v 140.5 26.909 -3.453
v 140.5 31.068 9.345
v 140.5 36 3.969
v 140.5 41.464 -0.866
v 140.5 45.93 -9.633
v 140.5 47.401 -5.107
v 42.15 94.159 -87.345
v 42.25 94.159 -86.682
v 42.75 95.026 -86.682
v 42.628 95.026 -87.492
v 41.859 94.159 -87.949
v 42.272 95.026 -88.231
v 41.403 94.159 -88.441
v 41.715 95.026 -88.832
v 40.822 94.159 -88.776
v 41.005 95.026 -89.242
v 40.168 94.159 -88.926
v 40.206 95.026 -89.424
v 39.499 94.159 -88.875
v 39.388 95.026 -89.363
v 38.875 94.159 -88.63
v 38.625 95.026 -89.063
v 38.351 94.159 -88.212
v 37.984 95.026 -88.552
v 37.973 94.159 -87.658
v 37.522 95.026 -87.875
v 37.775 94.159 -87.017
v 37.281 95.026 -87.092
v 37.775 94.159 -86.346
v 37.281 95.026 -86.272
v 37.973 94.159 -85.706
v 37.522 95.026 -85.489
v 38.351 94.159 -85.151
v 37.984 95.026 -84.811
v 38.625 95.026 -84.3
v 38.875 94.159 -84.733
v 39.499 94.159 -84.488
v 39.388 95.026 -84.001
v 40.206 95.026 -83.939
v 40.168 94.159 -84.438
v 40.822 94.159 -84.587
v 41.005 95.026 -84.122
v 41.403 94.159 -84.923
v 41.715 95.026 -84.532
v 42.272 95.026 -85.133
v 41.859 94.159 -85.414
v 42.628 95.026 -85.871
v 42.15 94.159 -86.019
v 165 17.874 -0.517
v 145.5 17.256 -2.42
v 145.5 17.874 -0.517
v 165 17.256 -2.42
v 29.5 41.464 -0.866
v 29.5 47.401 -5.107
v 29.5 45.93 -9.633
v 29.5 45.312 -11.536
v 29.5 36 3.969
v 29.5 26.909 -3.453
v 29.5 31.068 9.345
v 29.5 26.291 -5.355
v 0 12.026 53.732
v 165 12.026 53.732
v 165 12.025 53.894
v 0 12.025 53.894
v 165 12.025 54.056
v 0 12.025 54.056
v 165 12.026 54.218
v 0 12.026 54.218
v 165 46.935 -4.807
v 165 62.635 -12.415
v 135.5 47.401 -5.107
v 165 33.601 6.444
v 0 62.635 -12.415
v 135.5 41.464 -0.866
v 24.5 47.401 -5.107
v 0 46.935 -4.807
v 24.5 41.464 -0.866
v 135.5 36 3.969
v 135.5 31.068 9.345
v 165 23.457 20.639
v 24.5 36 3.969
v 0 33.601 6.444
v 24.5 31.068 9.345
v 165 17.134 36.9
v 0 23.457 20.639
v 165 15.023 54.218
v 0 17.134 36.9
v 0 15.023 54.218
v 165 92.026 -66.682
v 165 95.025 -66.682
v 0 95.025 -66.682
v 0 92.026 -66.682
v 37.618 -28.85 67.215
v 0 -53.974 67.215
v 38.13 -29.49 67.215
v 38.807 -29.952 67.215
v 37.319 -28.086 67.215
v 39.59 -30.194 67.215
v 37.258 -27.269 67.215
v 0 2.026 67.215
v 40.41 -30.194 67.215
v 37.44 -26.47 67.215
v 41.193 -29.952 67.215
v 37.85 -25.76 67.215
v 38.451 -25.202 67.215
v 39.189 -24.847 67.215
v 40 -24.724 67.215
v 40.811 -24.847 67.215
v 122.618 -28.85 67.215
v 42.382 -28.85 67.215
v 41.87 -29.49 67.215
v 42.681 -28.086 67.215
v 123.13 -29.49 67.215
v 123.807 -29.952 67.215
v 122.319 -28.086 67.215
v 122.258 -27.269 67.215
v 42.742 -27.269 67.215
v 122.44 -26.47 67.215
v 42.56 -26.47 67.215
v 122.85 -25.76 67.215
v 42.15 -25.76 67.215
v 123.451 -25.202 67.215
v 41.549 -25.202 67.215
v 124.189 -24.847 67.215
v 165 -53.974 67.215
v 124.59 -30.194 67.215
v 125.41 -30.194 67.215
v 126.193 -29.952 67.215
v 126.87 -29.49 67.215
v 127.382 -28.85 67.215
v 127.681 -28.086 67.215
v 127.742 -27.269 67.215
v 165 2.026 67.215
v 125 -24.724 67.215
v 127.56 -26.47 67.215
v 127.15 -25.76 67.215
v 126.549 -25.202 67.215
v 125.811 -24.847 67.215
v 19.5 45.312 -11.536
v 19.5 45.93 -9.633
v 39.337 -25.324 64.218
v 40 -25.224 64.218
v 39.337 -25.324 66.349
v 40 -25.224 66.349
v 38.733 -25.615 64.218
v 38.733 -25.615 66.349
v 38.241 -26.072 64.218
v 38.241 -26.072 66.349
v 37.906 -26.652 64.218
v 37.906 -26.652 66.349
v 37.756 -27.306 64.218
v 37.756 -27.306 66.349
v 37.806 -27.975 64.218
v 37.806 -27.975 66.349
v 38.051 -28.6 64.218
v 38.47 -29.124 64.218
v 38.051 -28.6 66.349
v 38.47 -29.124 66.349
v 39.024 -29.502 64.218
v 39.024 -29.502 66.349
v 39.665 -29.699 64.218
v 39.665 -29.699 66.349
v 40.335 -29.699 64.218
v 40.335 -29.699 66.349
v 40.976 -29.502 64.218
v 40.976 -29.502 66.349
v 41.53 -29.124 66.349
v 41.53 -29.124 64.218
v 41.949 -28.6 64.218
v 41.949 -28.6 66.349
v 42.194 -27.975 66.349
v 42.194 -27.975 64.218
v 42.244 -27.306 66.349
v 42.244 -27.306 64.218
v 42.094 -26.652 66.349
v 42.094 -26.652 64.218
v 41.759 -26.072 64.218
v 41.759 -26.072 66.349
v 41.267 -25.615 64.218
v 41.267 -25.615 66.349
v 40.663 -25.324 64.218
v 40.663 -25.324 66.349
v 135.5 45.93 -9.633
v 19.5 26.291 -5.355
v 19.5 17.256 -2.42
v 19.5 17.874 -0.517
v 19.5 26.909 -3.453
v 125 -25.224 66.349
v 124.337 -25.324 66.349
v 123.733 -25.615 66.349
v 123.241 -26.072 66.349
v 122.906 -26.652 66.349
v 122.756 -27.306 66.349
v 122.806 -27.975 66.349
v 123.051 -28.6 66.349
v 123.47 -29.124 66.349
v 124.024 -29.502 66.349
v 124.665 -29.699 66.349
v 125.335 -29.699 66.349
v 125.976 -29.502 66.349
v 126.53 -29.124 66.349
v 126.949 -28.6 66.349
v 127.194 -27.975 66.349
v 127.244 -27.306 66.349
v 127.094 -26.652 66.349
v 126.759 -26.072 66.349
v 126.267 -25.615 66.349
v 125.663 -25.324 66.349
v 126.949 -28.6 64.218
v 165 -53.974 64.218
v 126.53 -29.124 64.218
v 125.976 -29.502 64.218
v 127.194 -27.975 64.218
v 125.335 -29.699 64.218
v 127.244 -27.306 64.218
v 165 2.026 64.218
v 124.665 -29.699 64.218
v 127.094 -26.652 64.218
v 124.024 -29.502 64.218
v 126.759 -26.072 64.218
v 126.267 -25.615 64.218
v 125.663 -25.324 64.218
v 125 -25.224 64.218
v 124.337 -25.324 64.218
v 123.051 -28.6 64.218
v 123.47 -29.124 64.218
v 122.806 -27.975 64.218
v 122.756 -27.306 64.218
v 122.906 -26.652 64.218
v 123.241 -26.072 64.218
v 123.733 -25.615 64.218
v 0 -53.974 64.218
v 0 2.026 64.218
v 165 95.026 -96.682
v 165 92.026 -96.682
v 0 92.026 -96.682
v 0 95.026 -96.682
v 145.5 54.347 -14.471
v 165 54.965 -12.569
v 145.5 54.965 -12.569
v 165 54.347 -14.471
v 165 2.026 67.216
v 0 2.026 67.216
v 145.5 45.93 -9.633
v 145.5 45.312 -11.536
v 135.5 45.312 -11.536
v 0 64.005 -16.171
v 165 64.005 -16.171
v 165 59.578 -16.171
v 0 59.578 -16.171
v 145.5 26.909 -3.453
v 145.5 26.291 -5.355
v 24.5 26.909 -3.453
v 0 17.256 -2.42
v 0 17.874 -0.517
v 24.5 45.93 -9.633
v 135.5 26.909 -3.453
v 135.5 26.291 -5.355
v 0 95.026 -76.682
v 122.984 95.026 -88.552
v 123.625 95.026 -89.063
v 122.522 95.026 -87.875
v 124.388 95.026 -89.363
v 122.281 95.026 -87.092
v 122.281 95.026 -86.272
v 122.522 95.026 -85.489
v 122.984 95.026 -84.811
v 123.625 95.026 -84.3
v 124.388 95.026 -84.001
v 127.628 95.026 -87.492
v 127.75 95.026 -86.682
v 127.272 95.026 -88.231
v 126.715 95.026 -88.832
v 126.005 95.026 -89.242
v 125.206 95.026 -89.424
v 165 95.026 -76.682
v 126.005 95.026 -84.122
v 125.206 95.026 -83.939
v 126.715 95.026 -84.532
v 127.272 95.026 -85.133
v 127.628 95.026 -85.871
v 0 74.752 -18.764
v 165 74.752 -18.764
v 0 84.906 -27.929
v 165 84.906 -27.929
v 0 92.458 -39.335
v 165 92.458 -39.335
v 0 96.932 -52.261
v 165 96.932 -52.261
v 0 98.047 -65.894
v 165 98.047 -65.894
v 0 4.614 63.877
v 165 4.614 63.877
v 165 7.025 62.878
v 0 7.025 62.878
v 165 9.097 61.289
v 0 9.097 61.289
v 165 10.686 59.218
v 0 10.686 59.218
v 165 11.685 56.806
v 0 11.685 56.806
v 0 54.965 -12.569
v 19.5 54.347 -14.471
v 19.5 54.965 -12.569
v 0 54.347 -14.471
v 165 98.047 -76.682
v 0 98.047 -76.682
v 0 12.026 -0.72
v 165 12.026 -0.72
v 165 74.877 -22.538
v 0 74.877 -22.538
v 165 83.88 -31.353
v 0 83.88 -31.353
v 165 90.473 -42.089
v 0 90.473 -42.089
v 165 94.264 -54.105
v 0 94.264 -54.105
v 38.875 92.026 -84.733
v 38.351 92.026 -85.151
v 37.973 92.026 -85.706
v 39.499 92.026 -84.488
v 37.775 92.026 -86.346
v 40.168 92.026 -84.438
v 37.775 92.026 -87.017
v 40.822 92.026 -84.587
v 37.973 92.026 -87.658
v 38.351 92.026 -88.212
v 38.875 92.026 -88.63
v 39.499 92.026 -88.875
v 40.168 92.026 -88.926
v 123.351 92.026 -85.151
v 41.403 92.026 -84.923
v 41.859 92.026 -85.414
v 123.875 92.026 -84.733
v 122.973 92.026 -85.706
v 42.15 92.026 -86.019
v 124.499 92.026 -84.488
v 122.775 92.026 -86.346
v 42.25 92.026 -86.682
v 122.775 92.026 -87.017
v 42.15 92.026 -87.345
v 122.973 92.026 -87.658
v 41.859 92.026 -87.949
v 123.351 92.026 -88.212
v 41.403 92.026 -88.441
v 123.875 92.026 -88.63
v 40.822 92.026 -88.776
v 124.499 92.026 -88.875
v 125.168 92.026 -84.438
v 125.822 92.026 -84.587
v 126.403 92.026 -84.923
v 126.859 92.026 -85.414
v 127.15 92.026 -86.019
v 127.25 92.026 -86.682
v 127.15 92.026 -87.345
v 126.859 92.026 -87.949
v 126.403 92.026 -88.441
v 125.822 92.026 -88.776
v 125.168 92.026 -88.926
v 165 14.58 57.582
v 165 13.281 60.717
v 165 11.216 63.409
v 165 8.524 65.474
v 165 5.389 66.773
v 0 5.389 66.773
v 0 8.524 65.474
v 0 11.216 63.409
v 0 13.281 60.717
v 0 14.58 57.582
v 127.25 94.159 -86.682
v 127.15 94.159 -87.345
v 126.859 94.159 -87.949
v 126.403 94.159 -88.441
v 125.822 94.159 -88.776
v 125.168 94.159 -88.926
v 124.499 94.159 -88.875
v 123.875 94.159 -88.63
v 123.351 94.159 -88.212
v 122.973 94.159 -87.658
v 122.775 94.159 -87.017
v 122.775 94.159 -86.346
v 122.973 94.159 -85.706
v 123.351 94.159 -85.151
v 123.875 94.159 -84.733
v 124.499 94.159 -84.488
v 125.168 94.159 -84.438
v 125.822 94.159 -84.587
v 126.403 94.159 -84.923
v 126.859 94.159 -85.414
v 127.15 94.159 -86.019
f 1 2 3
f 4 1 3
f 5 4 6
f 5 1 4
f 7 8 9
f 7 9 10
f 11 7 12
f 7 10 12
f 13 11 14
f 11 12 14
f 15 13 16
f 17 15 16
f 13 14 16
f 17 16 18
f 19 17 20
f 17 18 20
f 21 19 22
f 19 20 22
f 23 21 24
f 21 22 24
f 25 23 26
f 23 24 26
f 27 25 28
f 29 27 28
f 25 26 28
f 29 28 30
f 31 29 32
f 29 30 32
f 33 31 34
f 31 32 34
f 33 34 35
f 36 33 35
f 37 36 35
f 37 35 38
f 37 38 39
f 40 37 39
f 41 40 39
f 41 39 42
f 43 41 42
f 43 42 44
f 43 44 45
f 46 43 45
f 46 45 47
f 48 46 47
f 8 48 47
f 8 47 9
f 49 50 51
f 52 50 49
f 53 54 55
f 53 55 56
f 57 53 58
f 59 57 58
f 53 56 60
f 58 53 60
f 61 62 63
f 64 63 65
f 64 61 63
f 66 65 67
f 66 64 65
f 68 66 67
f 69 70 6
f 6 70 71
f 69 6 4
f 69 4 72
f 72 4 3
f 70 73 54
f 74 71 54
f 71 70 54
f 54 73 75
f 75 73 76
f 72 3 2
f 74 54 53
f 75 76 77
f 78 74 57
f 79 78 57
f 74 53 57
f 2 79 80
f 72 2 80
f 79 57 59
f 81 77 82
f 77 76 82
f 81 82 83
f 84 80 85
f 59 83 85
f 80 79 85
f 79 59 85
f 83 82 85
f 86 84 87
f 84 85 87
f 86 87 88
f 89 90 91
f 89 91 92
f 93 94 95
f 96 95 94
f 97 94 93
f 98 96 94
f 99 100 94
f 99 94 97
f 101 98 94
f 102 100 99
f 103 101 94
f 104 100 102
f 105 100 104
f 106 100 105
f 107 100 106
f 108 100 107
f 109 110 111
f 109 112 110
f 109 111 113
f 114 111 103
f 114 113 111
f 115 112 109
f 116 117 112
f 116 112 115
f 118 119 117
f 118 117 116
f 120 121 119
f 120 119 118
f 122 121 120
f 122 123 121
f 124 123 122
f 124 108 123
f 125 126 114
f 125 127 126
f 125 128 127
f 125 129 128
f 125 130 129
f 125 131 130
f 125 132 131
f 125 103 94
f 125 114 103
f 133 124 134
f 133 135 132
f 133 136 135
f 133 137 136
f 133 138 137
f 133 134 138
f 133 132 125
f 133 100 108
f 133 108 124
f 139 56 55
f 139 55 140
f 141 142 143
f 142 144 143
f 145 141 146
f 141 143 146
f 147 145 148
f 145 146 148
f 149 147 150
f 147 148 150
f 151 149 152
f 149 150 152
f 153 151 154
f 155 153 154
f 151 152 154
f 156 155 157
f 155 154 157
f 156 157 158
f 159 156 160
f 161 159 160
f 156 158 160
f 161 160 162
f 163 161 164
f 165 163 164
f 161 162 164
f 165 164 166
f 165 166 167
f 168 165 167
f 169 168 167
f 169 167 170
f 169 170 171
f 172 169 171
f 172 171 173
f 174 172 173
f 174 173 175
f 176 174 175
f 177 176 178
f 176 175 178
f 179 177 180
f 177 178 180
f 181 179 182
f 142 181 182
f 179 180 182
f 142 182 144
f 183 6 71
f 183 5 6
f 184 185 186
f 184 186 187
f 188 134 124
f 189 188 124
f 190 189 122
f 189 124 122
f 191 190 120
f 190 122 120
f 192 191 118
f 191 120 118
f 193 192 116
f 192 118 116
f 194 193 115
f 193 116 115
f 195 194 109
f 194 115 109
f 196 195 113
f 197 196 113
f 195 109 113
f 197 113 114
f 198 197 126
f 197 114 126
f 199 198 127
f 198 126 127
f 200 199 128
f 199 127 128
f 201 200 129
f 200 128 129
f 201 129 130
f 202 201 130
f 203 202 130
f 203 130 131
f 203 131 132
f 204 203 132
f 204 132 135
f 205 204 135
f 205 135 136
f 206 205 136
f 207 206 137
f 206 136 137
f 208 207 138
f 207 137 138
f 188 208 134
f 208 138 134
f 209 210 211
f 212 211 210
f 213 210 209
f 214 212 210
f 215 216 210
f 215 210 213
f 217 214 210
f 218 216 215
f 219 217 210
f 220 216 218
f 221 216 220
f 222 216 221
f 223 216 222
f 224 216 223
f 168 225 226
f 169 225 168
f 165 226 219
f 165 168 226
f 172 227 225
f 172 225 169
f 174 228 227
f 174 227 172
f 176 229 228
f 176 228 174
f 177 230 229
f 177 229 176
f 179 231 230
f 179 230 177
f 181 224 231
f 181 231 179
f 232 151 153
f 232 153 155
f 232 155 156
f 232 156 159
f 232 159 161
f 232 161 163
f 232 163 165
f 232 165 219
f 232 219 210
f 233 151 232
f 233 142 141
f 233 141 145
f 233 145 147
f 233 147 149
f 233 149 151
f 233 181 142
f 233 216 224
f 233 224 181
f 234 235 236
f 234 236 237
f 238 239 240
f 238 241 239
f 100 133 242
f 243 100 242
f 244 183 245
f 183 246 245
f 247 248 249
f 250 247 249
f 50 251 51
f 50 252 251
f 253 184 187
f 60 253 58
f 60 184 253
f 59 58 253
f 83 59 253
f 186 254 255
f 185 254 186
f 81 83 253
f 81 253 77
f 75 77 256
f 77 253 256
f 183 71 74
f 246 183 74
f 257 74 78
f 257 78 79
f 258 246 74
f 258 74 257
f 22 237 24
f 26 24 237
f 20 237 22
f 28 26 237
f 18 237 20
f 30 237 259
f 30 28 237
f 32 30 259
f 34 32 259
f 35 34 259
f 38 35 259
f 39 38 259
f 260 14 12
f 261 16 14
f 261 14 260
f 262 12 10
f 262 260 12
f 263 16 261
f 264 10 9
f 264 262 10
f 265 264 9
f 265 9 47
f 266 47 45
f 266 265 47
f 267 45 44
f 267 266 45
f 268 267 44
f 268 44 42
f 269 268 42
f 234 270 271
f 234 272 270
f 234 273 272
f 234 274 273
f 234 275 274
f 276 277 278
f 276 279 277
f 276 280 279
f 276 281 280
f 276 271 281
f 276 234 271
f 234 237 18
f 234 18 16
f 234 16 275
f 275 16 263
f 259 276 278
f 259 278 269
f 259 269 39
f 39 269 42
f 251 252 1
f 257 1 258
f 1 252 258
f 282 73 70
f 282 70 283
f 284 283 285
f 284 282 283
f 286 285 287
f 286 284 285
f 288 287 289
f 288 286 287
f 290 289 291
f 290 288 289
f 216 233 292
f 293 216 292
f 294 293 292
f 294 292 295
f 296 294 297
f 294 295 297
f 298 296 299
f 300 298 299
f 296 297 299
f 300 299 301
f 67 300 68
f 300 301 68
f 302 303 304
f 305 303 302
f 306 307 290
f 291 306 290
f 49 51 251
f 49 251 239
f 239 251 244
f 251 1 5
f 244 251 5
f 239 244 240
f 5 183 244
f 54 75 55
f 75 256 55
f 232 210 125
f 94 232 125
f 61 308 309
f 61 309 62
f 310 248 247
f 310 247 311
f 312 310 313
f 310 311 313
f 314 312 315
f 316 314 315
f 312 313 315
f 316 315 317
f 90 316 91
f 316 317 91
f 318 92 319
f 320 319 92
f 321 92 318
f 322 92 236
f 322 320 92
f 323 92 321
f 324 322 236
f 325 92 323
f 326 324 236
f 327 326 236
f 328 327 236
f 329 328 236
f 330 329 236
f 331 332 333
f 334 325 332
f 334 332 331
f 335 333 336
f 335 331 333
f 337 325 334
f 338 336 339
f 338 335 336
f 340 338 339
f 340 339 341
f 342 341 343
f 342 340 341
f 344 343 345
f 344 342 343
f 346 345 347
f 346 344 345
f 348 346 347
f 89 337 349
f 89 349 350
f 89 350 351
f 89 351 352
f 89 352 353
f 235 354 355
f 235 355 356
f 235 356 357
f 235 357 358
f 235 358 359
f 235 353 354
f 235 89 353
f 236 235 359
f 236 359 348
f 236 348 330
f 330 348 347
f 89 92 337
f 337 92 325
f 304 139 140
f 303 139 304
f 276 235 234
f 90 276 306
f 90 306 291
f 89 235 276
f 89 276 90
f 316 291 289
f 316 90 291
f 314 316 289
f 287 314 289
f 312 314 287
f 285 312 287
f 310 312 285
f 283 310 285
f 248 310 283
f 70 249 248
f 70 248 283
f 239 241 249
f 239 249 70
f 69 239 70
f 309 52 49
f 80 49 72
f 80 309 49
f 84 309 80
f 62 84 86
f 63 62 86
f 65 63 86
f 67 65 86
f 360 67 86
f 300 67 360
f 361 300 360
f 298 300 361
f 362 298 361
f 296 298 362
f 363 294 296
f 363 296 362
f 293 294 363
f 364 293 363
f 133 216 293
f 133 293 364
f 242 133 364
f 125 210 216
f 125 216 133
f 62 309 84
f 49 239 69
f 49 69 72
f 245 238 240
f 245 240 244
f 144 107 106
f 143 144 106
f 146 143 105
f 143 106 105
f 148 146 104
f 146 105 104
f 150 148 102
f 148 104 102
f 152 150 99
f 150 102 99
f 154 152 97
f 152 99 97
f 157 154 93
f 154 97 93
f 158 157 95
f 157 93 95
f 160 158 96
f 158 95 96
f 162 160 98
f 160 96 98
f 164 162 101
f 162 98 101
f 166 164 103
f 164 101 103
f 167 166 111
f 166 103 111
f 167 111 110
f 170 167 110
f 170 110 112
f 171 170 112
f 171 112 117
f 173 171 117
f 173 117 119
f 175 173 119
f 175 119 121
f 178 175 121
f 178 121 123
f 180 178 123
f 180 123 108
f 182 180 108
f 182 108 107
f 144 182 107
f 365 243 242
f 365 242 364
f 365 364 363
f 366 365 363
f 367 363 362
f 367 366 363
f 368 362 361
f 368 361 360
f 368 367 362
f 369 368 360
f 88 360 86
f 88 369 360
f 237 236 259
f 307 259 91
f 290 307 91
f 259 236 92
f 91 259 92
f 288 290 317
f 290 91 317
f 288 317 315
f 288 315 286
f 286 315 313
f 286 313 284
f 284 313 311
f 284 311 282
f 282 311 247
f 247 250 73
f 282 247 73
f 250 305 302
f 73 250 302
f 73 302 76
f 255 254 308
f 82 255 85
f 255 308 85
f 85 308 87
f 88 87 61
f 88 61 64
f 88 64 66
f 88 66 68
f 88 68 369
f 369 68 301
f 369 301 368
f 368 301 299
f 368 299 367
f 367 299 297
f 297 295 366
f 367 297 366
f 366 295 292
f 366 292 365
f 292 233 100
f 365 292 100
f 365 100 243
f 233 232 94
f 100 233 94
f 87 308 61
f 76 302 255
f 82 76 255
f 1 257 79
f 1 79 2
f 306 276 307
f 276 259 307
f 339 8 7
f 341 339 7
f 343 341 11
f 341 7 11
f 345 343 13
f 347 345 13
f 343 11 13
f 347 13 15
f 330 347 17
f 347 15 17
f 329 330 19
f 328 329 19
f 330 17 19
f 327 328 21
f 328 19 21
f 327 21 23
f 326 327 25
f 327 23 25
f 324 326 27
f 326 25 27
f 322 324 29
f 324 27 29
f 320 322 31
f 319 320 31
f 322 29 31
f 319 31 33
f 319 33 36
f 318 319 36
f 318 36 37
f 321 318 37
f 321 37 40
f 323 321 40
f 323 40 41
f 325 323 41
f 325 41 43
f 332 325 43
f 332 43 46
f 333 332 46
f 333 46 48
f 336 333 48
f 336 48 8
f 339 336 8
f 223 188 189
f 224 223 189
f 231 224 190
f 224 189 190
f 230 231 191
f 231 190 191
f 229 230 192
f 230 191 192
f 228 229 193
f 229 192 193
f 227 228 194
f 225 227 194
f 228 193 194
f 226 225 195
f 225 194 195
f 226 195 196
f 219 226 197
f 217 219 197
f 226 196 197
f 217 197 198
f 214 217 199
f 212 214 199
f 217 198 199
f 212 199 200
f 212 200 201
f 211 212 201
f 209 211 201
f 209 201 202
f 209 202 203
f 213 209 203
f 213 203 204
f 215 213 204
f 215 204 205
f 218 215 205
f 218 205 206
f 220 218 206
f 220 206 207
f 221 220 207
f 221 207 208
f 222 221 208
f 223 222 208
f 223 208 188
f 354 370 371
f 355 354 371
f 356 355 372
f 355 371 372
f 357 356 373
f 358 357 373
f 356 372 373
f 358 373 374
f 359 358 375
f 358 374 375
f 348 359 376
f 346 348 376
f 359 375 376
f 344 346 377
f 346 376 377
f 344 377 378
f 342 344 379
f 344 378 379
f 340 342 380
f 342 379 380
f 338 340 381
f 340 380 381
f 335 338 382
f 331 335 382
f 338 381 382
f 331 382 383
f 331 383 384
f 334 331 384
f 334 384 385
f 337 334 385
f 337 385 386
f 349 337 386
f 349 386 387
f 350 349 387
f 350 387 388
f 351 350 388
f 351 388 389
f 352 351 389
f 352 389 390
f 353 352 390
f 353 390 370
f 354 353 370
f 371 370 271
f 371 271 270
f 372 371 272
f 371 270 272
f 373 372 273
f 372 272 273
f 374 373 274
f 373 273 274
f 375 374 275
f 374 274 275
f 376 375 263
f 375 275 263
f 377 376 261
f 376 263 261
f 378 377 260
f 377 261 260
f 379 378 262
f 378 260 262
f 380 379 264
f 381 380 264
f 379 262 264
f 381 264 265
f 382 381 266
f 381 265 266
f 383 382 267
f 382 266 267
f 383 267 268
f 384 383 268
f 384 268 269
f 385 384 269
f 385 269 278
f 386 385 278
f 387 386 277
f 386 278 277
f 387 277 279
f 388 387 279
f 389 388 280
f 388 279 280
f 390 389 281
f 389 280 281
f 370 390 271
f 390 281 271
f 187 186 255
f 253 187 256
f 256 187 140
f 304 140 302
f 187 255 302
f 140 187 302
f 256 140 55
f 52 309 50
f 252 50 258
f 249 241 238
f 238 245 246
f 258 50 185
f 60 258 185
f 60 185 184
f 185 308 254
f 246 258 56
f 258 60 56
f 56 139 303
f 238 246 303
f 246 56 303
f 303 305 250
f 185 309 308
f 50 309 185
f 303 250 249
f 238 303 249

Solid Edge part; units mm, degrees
sketch "Sketch1" plane through (0, 0, 0) normal (1, 0, 0) x (0, 1, 0)
  arc A0 (2.0255, 64.2182) -> (12.0255, 54.2182) centre (2.0255, 54.2182) cw
  arc A1 (12.0255, 54.2182) -> (62.1552, -15.4154) centre (85.1165, 53.9757) ccw
  arc A2 (62.1552, -15.4154) -> (95.0255, -66.6818) centre (43.6001, -63.4831) cw
  line L0 (95.0255, -66.6818) -> (95.0255, -76.6818)
  line L1 (95.0255, -76.6818) -> (98.0468, -76.6818)
  line L2 (98.0468, -76.6818) -> (98.0468, -65.8944)
  arc A3 (62.6354, -12.4154) -> (98.0468, -65.8944) centre (43.6001, -63.4831) cw
  arc A4 (15.0228, 54.2182) -> (62.6354, -12.4154) centre (85.1165, 53.9757) ccw
  arc A5 (2.0255, 67.2155) -> (15.0228, 54.2182) centre (2.0255, 54.2182) cw
  line L3 (2.0255, 64.2182) -> (2.0255, 67.2155)
  dimension "D1" = 130.9
  dimension "D2" = 93
  dimension "D3" = 10
  dimension "D4" = 10
  dimension "D5" = 3
  dimension "D6" = 2.9973
  dimension "D7" = 12.9973
extrude "Protrusion1" add sketch "Sketch1" along normal blind 165
sketch "Sketch2" plane through (75, 2.0255, 65.7168) normal (0, -1, 0) x (1, 0, 0)
  line L0 (-75, 1.4986) -> (90, 1.4986)
  line L1 (90, 1.4986) -> (90, -1.4986)
  line L2 (90, -1.4986) -> (-75, -1.4986)
  line L3 (-75, -1.4986) -> (-75, 1.4986)
extrude "Extrusionsausprägung_2" add sketch "Sketch2" along normal blind 56
sketch "Sketch3" plane through (82.5, -22.9745, 67.2155) normal (0, 0, 1) x (0, 1, 0)
  circle A0 centre (-4.5, 42.5) radius 2.25
  circle A1 centre (-4.5, -42.5) radius 2.25
  dimension "D1" = 40
  dimension "D2" = 26.5
  dimension "D3" = 4.5
extrude "Cutout1" cut sketch "Sketch3" against normal through all
sketch "Sketch4" plane through (165, 28.0437, -4.7332) normal (1, 0, 0) x (0, 1, 0)
  line L0 (66.9818, -61.9486) -> (63.9818, -61.9486)
  line L1 (63.9818, -61.9486) -> (63.9818, -91.9486)
  line L2 (63.9818, -91.9486) -> (66.9818, -91.9486)
  line L3 (66.9818, -91.9486) -> (66.9818, -61.9486)
  dimension "D1" = 3
  dimension "D2" = 30
extrude "Protrusion2" add sketch "Sketch4" against normal up to vertex (165 mm away)
sketch "Sketch5" plane through (82.5, 95.0255, -86.6818) normal (0, 1, 0) x (1, 0, 0)
  circle A0 centre (-42.5, 0) radius 2.25
  circle A1 centre (42.5, 0) radius 2.25
  dimension "D1" = 85
  dimension "D2" = 4.5
extrude "Cutout2" cut sketch "Sketch5" against normal through all
sketch "Sketch6" plane through (0, 22.0628, -14.7332) normal (-1, 0, 0) x (0, -1, 0)
  line L0 (10.0373, 14.0132) -> (10.0373, 68.9514)
  arc A0 (-42.5155, -1.4376) -> (10.0373, 68.9514) centre (-69.9949, 73.8912) ccw
  line L1 (-42.5155, -1.4376) -> (-37.5155, -1.4376)
  line L2 (10.0373, 14.0132) -> (-37.5155, -1.4376)
  dimension "D1" = 5
  dimension "D2" = 50
extrude "Protrusion3" add sketch "Sketch6" against normal up to vertex (165 mm away)
sketch "Sketch7" plane through (82.5, 16.3444, -2.1232) normal (0, -0.309, -0.9511) x (0, -0.9511, 0.309)
  line L0 (-0.9588, 82.5) -> (-0.9588, 63)
  line L1 (-0.9588, 63) -> (-39.9588, 63)
  line L2 (-39.9588, 63) -> (-39.9588, 82.5)
  line L3 (-39.9588, 82.5) -> (-0.9588, 82.5)
  line L4 (-39.9588, -63) -> (-0.9588, -63)
  line L5 (-0.9588, -63) -> (-0.9588, -82.5)
  line L6 (-0.9588, -82.5) -> (-39.9588, -82.5)
  line L7 (-39.9588, -82.5) -> (-39.9588, -63)
  dimension "D1" = 39
  dimension "D2" = 19.5
extrude "Extrusionsausschnitt_3" cut sketch "Sketch7" against normal blind 2
sketch "Sketch8" plane through (82.5, 16.3444, -2.1232) normal (0, -0.309, -0.9511) x (0, -0.9511, 0.309)
  line L0 (-30.4588, 63) -> (-10.4588, 63)
  line L1 (-10.4588, 63) -> (-10.4588, 53)
  line L2 (-10.4588, 53) -> (-30.4588, 53)
  line L3 (-30.4588, 53) -> (-30.4588, 63)
  line L4 (-30.4588, -63) -> (-10.4588, -63)
  line L5 (-10.4588, -63) -> (-10.4588, -53)
  line L6 (-10.4588, -53) -> (-30.4588, -53)
  line L7 (-30.4588, -53) -> (-30.4588, -63)
  dimension "D1" = 20
  dimension "D2" = 10
extrude "Extrusionsausschnitt_4" cut sketch "Sketch8" against normal blind 2
sketch "Sketch9" plane through (14.75, 36.4199, -6.5432) normal (0, -0.309, -0.9511) x (1, 0, 0)
  line L0 (14.75, 10) -> (9.75, 10)
  line L1 (9.75, 10) -> (9.75, -10)
  line L2 (9.75, -10) -> (14.75, -10)
  line L3 (14.75, -10) -> (14.75, 10)
  line L4 (120.75, 10) -> (125.75, 10)
  line L5 (125.75, 10) -> (125.75, -10)
  line L6 (125.75, -10) -> (120.75, -10)
  line L7 (120.75, -10) -> (120.75, 10)
extrude "Extrusionsausschnitt_5" cut sketch "Sketch9" against normal blind 56.6903
chamfer "Fase_1" distance 0.5 angle 60 4 edges at (125, -29.7245, 67.2155) (40, -29.7245, 67.2155) (122.75, 95.0255, -86.6818) (37.75, 95.0255, -86.6818) measured on face at (25.85, -44.0812, 67.2154)
properties material "Nylon, allgemein"
